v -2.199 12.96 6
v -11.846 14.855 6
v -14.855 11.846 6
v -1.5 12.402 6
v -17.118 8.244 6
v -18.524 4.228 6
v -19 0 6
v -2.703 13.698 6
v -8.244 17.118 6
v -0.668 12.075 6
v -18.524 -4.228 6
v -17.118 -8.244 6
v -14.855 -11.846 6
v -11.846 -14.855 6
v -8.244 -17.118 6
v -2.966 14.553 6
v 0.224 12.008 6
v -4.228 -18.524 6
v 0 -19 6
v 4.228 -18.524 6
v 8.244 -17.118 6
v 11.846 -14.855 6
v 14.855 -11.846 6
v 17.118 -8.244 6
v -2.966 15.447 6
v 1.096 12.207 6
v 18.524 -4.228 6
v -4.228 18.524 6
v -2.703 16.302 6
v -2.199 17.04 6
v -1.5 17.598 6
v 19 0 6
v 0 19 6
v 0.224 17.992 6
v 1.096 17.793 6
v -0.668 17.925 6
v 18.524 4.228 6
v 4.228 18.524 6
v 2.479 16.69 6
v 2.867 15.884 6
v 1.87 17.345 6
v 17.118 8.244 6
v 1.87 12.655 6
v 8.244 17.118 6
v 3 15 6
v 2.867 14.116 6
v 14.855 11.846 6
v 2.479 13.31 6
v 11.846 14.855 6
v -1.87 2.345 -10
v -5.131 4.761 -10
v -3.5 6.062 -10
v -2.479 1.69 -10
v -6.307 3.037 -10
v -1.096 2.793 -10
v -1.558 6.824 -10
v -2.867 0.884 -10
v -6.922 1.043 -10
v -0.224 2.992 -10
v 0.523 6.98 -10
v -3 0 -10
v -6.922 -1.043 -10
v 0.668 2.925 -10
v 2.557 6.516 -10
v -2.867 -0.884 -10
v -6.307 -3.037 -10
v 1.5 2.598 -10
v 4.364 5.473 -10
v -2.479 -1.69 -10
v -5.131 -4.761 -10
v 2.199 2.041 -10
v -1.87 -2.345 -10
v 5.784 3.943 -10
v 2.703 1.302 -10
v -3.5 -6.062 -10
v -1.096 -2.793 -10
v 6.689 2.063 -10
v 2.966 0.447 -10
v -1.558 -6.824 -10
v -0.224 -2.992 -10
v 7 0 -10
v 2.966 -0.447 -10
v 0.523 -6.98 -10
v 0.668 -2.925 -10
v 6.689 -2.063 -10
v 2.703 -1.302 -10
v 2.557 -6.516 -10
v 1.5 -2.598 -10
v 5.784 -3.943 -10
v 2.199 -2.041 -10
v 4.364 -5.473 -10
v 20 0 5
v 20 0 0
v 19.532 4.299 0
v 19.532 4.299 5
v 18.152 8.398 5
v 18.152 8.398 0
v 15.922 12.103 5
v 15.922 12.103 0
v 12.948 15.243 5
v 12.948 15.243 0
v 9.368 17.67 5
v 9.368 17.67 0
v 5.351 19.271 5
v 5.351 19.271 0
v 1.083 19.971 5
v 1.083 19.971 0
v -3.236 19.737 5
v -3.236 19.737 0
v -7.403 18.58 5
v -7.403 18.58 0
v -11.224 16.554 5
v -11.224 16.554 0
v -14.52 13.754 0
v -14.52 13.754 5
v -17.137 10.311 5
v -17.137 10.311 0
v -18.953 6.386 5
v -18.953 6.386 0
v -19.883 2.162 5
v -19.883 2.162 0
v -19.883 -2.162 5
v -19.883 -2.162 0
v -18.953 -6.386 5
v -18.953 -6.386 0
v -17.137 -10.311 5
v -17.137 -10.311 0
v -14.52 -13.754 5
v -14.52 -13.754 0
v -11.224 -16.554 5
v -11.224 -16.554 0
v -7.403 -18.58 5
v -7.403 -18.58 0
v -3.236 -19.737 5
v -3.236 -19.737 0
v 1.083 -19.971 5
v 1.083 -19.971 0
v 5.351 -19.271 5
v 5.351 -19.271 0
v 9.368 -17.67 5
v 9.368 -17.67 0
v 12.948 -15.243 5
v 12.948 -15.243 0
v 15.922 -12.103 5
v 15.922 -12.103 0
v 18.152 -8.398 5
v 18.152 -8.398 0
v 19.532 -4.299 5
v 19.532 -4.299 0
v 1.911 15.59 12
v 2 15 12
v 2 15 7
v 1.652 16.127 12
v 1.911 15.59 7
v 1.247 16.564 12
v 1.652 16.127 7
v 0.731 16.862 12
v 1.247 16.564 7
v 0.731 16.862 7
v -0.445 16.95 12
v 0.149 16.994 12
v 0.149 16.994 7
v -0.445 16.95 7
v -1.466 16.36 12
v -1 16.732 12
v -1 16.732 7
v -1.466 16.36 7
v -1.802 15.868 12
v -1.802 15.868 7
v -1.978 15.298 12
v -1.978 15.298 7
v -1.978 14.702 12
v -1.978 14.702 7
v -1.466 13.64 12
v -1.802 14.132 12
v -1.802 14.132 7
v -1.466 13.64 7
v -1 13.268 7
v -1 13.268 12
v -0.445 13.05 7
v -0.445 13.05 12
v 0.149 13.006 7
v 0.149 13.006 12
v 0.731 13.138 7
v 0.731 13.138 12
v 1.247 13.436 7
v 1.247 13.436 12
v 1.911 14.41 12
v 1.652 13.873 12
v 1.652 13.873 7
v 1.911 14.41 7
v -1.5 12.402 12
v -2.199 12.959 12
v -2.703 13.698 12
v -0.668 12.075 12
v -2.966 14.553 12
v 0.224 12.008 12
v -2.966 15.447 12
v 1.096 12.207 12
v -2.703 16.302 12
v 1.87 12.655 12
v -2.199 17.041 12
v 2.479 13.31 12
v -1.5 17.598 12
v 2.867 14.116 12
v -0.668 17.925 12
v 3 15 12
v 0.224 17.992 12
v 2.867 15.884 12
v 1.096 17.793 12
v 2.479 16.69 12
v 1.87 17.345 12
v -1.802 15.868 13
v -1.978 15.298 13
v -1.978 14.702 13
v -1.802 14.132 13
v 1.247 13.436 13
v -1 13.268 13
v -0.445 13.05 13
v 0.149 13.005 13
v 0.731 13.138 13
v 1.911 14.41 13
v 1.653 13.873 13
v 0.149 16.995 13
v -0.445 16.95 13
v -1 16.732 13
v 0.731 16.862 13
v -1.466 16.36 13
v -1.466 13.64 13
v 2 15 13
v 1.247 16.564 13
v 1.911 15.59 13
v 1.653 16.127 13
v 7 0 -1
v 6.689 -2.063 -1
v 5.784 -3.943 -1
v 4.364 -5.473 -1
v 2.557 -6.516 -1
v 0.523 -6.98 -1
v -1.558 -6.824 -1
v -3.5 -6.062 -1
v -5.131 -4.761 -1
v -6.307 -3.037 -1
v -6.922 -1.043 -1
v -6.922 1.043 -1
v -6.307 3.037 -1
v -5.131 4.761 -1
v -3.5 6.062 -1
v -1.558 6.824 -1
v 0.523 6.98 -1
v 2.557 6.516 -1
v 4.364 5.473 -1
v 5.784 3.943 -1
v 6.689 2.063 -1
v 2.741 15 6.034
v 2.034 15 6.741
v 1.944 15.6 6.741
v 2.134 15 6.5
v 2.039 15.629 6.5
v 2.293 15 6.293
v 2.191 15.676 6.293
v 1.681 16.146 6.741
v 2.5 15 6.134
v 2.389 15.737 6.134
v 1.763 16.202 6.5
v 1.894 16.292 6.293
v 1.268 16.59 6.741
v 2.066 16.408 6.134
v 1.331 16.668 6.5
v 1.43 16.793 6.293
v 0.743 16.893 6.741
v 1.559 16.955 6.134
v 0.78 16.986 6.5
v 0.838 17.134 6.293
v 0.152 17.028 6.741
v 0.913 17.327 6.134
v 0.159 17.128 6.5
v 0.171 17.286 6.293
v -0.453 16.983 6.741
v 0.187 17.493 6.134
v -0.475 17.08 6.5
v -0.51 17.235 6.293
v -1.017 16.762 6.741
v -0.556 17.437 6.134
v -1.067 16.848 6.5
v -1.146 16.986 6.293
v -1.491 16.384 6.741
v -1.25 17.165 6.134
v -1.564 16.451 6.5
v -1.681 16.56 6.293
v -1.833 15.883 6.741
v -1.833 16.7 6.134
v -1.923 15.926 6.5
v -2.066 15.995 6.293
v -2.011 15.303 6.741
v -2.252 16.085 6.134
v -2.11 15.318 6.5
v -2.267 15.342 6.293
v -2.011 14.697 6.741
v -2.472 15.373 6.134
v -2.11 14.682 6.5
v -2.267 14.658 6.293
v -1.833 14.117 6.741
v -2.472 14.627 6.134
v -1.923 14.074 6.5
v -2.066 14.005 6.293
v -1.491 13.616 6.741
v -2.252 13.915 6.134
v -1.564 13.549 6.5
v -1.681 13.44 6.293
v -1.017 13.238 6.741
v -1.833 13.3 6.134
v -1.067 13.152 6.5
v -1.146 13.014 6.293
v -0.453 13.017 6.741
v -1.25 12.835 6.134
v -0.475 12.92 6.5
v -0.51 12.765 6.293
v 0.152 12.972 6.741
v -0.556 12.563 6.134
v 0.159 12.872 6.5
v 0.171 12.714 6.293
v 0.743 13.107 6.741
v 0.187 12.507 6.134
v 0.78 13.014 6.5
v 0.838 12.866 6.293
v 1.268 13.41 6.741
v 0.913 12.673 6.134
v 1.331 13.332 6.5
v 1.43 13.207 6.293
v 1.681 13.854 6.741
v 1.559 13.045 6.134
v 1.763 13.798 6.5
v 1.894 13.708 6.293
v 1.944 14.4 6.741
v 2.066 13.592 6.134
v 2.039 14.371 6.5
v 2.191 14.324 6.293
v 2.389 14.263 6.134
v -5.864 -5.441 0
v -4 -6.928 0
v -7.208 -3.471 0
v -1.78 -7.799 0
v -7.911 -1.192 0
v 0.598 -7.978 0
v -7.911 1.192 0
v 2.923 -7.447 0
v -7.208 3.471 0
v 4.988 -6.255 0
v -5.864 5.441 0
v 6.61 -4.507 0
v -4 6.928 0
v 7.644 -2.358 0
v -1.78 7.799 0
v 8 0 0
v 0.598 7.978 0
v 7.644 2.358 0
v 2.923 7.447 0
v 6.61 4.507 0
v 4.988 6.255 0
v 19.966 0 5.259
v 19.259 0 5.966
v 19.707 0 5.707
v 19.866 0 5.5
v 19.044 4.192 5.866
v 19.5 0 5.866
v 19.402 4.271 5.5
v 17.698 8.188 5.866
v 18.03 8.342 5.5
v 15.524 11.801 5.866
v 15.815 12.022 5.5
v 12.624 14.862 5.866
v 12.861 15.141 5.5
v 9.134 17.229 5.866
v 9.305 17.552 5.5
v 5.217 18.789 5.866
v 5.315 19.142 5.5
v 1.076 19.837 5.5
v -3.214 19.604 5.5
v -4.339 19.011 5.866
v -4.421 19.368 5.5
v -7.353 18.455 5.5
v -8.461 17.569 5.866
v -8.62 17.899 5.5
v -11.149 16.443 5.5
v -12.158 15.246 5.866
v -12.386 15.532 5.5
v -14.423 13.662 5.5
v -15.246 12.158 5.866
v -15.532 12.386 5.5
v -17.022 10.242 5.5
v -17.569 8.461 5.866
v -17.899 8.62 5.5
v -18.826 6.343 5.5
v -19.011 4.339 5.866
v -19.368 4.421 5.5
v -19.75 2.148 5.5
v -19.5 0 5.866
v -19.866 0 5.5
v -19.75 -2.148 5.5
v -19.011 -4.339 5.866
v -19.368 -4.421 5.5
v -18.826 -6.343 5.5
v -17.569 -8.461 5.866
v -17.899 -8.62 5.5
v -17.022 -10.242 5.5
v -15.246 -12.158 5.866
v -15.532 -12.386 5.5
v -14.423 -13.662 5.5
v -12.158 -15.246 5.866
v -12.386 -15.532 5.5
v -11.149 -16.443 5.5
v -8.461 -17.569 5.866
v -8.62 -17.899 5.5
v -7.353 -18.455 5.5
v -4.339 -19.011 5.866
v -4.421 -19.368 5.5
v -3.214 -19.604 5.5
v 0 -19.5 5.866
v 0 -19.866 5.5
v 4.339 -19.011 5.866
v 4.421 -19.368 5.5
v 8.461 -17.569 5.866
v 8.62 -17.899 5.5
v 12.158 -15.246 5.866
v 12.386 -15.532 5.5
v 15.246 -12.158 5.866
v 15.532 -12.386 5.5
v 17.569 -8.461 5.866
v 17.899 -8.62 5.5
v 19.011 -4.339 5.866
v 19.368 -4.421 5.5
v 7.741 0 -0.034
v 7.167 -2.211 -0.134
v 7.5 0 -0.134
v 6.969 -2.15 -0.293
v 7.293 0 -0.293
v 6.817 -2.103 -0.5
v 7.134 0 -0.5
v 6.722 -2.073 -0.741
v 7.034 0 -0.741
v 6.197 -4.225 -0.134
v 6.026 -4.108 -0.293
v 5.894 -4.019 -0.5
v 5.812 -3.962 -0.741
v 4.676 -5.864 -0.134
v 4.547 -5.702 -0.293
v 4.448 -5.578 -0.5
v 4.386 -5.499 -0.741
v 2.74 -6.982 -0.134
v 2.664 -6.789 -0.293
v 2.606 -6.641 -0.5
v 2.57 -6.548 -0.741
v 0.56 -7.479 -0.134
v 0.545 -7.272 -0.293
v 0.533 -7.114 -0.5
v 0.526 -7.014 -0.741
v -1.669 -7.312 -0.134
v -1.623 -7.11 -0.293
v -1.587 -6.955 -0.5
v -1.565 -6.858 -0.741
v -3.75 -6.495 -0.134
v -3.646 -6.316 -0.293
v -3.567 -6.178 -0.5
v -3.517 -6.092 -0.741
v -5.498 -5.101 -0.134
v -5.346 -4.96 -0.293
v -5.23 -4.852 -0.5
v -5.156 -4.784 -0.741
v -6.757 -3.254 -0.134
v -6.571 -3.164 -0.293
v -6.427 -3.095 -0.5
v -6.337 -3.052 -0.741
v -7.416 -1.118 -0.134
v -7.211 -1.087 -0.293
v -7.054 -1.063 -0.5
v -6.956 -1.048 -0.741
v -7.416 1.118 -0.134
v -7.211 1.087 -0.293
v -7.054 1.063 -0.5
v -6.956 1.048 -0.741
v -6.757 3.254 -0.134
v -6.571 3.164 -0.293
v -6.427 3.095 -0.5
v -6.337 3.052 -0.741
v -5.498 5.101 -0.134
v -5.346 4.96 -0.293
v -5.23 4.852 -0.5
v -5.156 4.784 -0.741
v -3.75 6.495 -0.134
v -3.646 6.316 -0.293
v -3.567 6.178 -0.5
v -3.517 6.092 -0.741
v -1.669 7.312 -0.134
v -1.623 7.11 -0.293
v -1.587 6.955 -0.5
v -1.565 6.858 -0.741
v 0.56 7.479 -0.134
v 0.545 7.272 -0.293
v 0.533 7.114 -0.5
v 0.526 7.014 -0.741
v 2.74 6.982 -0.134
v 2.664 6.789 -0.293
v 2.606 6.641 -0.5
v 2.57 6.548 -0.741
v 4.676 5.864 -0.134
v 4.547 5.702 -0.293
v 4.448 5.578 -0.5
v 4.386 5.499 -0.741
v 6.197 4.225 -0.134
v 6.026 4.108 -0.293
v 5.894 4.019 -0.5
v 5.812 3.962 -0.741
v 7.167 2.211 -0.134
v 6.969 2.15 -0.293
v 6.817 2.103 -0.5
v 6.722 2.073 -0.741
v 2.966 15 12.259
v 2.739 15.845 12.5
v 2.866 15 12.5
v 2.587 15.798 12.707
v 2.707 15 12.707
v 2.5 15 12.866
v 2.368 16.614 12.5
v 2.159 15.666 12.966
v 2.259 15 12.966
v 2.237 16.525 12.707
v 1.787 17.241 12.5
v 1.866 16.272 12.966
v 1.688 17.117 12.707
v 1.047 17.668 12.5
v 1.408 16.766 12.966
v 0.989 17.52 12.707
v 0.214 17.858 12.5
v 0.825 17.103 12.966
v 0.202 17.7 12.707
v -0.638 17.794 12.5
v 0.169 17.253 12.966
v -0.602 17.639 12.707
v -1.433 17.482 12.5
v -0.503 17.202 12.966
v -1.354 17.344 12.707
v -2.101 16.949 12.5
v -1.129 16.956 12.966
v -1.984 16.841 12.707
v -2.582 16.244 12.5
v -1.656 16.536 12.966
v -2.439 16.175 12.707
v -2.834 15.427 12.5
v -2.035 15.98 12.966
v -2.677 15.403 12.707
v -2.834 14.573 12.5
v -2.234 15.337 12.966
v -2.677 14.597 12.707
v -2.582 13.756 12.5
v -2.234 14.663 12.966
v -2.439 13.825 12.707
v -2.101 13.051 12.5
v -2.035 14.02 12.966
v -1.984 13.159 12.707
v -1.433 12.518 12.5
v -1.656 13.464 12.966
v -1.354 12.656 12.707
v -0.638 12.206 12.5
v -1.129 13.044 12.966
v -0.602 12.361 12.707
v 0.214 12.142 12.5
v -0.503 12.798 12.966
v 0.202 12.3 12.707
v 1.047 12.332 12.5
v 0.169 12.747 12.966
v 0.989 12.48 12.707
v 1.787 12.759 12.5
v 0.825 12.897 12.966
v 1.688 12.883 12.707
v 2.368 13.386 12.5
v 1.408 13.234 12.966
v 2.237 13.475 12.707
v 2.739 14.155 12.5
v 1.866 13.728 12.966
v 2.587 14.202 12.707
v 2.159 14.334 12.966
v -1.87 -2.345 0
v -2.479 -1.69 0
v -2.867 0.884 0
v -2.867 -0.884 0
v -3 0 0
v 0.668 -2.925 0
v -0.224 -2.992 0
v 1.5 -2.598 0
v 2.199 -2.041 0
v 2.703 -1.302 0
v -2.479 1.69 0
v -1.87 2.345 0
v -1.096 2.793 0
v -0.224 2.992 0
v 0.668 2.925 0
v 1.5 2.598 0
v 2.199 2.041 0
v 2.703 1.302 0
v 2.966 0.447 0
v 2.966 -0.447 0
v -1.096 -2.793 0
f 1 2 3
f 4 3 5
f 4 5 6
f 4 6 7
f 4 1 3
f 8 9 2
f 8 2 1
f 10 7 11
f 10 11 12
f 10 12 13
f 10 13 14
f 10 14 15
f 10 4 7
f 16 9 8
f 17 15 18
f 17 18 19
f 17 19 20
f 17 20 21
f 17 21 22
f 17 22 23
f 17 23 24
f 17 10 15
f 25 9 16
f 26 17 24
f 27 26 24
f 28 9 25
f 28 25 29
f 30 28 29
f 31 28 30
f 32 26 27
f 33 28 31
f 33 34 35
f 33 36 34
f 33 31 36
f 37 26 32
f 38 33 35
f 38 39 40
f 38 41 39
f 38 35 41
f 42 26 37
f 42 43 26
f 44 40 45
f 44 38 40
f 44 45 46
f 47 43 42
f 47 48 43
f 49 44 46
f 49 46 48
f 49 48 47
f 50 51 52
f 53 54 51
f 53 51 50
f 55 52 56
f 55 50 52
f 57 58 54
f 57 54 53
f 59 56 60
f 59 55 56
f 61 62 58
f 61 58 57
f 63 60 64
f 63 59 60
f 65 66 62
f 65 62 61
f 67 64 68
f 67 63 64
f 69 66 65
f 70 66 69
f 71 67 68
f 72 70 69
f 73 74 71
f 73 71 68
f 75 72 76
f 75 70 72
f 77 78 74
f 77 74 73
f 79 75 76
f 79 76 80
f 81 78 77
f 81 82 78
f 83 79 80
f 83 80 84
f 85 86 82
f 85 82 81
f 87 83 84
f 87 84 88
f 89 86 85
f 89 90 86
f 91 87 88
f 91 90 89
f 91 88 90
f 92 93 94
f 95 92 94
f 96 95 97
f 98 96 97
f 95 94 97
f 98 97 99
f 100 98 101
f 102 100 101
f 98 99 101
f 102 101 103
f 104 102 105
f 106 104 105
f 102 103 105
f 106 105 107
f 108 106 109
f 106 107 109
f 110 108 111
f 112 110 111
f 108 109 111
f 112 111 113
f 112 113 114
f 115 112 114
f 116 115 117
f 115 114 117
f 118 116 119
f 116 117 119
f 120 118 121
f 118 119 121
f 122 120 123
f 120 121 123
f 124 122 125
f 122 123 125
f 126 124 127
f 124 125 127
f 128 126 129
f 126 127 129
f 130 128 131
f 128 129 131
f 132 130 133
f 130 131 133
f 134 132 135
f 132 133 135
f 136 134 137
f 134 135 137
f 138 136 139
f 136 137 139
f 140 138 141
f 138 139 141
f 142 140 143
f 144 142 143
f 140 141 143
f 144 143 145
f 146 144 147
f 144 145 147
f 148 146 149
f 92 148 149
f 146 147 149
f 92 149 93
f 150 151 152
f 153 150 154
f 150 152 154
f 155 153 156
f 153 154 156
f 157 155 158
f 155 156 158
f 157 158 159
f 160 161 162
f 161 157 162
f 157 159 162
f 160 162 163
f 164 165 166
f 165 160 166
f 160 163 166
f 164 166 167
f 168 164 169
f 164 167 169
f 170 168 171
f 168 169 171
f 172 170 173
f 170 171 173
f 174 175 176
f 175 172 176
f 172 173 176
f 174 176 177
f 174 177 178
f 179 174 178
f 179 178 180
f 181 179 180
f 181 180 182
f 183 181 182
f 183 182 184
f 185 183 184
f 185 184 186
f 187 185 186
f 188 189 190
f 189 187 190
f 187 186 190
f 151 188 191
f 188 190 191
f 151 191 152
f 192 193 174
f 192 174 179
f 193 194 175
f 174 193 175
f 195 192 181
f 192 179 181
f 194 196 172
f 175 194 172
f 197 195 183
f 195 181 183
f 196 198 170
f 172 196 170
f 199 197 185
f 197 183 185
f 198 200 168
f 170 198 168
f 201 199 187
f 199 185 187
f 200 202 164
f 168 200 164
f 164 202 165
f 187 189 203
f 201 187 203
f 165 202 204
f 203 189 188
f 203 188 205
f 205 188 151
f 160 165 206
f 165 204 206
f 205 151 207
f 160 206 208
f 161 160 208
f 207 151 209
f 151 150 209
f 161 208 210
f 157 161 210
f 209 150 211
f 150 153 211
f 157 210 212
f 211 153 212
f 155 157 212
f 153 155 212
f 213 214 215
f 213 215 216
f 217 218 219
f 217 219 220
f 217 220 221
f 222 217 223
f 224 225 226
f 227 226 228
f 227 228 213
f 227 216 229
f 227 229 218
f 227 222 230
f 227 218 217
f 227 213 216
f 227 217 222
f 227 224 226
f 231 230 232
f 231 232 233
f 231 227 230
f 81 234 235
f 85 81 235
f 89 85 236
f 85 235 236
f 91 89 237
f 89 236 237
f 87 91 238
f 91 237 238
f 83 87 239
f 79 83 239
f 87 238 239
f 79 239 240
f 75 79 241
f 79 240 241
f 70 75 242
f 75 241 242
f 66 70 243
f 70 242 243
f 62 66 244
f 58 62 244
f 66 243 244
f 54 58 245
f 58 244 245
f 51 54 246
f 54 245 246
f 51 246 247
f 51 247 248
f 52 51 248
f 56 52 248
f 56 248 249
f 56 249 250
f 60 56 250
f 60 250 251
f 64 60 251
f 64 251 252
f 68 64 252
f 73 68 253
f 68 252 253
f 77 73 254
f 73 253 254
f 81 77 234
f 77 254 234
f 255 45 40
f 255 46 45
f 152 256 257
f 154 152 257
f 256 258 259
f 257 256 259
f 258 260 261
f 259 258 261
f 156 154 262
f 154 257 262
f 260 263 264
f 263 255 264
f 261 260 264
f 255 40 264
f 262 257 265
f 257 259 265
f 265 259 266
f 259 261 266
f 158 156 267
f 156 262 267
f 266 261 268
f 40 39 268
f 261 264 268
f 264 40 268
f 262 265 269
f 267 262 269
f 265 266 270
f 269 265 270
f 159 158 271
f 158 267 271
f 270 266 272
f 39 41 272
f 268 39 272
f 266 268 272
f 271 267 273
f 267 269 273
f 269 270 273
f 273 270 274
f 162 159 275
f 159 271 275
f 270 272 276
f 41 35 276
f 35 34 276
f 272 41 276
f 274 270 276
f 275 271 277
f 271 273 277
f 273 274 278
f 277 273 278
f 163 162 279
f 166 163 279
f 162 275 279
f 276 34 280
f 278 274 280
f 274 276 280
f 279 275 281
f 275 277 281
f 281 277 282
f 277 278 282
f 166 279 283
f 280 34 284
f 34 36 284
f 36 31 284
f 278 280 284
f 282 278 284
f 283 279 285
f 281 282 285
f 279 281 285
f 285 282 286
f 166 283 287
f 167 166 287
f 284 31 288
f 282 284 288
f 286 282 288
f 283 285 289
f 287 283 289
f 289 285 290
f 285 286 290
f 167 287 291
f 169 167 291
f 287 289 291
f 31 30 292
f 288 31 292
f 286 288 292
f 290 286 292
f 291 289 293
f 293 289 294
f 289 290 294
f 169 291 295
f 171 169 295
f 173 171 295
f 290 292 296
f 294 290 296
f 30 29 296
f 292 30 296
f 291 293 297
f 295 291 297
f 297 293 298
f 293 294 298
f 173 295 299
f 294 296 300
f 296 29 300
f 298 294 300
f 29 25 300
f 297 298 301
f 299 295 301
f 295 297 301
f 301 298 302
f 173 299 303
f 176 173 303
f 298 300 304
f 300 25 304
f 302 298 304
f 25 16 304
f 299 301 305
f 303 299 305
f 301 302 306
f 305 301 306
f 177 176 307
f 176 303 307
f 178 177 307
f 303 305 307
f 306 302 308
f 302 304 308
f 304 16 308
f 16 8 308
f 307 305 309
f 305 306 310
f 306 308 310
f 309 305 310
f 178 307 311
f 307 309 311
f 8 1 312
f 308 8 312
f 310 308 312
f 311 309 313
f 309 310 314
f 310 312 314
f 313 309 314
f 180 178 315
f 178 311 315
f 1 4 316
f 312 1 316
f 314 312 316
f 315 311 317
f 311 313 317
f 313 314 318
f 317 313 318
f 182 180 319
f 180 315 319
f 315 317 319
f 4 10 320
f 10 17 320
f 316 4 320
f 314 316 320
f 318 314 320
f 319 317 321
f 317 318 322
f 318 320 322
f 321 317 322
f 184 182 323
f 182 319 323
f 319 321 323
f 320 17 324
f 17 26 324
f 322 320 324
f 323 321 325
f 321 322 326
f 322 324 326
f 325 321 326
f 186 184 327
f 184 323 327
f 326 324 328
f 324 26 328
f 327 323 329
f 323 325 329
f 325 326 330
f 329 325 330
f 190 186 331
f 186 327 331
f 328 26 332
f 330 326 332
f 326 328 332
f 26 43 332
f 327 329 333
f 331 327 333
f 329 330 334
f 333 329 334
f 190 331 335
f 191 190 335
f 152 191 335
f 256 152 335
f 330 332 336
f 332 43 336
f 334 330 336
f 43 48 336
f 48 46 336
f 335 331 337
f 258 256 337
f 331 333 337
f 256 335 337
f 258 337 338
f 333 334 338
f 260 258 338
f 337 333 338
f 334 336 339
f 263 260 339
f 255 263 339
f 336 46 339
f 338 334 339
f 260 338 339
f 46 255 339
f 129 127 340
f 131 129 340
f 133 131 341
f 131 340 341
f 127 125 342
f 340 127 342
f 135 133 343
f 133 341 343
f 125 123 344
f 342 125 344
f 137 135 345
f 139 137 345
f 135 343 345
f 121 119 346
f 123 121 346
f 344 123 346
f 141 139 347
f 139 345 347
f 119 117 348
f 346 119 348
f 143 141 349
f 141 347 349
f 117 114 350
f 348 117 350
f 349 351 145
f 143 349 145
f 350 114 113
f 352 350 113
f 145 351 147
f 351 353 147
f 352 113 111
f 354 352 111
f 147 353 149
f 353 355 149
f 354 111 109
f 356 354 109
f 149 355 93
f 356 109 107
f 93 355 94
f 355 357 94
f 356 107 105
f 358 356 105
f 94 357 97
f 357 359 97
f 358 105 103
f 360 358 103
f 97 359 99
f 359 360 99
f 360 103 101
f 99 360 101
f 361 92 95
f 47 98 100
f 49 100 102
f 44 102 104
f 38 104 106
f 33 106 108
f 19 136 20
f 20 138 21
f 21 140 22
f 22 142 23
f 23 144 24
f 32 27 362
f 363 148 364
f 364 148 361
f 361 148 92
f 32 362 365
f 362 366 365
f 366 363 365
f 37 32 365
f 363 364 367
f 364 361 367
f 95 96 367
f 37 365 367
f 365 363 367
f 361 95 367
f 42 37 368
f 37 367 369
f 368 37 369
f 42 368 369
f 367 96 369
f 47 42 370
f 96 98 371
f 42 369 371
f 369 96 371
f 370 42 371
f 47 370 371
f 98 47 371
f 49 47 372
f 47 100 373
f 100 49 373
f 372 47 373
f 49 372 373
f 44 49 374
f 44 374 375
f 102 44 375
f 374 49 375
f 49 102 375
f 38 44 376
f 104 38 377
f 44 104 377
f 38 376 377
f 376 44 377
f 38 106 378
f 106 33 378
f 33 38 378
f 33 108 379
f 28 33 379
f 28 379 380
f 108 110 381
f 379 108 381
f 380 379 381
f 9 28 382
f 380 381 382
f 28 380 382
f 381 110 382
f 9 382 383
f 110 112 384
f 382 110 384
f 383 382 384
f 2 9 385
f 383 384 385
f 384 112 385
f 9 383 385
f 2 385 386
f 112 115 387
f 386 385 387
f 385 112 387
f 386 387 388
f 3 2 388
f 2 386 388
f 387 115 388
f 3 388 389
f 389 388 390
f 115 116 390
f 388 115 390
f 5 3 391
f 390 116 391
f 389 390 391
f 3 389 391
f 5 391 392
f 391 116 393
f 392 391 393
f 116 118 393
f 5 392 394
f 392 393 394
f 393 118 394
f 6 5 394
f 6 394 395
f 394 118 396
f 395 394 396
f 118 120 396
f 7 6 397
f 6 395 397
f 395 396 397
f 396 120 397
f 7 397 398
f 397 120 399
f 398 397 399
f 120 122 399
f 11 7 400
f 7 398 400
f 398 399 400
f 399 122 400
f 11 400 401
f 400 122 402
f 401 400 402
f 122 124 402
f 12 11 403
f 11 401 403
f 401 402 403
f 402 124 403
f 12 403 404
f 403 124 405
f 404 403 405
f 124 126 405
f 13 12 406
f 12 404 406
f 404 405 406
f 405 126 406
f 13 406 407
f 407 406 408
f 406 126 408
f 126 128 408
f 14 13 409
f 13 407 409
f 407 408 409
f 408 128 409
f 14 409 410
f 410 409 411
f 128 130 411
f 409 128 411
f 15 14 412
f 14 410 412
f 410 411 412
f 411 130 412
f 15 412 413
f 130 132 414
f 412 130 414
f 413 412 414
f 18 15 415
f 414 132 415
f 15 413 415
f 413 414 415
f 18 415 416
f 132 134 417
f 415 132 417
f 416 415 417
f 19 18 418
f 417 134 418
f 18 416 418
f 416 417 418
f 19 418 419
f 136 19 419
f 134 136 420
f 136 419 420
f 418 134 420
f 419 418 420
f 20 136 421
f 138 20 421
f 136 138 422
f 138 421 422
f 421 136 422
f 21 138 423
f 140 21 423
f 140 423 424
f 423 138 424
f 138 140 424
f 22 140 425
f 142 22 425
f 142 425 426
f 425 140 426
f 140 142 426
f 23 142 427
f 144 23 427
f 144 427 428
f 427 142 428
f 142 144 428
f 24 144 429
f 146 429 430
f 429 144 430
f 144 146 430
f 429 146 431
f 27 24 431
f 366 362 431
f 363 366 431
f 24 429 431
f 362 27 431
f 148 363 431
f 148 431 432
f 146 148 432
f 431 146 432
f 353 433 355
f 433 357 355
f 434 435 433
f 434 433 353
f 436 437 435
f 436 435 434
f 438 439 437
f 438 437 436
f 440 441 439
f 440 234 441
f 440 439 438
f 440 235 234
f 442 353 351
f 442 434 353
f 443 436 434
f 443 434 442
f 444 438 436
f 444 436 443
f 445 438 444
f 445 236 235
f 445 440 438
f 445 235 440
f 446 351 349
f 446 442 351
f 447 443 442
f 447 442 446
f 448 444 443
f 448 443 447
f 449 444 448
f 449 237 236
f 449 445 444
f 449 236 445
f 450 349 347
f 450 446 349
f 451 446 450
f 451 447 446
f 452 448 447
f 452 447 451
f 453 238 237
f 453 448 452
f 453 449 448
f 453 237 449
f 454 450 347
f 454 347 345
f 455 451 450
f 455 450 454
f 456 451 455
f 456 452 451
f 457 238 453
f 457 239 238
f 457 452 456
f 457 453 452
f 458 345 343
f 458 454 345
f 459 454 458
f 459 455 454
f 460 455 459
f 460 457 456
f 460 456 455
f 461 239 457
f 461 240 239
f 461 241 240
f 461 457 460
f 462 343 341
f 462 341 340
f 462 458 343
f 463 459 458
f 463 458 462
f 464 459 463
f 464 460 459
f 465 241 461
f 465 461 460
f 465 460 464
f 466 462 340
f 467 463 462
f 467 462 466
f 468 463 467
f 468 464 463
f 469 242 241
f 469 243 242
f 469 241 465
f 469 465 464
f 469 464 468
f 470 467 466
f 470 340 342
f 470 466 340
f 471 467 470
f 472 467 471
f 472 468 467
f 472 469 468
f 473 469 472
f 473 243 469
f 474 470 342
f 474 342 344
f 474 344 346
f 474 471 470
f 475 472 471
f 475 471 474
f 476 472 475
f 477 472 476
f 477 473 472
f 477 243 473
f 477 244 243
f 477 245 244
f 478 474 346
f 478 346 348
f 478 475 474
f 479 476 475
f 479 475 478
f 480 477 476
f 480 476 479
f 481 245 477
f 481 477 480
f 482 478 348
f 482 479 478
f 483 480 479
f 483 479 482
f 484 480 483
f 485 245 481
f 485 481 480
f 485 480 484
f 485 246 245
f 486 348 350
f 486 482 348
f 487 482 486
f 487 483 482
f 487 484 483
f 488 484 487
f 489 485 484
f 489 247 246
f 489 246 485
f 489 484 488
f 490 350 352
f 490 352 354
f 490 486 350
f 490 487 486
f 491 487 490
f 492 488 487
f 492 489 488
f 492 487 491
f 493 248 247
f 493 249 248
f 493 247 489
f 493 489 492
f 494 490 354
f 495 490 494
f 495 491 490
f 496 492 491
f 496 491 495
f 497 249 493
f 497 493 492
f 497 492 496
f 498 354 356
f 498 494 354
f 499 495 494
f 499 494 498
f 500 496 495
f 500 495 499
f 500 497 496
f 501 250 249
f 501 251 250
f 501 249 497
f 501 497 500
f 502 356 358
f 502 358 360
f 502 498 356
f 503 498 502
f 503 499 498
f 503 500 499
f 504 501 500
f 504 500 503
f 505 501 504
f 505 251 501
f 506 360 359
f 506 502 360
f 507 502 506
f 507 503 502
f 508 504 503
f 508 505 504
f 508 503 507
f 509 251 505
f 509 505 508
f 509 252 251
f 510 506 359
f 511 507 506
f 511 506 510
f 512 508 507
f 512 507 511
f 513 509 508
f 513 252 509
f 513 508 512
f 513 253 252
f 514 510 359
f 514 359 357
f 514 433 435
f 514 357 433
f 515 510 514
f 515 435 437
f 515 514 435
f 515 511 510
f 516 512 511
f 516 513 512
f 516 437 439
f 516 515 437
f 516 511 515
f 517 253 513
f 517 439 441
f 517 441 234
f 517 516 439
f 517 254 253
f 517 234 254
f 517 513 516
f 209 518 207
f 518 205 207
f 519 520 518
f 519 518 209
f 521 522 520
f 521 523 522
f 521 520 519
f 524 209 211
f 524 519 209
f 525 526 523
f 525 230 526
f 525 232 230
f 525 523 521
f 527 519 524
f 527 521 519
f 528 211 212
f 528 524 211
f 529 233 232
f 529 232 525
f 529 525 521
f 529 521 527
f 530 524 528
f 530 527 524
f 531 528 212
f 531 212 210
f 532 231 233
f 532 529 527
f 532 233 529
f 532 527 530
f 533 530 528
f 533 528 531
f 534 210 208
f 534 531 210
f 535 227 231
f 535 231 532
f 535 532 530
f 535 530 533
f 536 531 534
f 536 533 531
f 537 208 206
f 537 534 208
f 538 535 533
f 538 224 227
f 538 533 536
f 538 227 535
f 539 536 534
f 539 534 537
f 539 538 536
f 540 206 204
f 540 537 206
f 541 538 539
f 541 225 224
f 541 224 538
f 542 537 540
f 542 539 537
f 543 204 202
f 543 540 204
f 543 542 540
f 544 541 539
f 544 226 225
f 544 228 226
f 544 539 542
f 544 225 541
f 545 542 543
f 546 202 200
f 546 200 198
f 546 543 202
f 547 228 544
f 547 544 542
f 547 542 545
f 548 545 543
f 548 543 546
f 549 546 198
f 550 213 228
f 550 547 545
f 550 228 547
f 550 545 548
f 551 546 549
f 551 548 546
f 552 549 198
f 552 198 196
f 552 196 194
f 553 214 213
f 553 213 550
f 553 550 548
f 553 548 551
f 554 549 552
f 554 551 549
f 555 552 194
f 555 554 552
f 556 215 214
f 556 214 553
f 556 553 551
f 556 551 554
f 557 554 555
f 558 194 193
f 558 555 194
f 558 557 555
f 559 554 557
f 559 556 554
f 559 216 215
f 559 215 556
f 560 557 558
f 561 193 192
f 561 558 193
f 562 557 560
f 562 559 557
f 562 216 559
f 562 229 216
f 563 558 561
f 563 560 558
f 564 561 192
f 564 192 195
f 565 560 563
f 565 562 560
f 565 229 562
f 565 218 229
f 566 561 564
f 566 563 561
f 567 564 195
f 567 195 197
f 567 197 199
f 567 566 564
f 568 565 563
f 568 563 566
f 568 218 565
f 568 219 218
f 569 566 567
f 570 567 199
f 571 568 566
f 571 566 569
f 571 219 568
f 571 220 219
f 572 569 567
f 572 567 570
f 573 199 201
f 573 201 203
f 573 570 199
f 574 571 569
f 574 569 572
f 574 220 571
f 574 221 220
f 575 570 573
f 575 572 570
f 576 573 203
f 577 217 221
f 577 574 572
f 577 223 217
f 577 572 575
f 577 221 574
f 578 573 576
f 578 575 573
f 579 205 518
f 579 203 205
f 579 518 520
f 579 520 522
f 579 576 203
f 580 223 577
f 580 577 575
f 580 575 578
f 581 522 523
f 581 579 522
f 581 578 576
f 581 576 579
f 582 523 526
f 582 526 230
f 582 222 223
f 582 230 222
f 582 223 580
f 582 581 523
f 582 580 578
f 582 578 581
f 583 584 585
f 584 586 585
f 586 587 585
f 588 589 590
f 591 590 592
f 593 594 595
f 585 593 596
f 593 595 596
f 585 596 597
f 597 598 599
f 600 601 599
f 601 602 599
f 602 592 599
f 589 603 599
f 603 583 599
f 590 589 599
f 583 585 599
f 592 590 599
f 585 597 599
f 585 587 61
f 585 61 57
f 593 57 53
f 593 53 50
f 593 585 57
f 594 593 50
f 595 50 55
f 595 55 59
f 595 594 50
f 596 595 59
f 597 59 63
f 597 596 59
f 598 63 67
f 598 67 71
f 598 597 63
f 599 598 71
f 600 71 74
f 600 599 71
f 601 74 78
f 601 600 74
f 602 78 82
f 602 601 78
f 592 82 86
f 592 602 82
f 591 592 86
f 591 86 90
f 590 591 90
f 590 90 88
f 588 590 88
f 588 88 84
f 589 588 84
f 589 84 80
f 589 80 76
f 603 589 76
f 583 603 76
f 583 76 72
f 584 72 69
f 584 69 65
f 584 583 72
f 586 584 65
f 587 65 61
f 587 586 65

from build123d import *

# Parameters (mm, degrees)
SKETCH1_R           = 20
BOSS_EXTRUDE1_DEPTH = 6
SKETCH2_R           = 7
SKETCH2_R_2         = 3
BOSS_EXTRUDE2_DEPTH = 10
SKETCH3_R           = 2
BOSS_EXTRUDE3_DEPTH = 7
SKETCH4_R           = 3
BOSS_EXTRUDE4_DEPTH = 1
FILLET1_R           = 1


with BuildPart() as part:
    # Sketch1 → Boss-Extrude1 (new body)
    with BuildSketch(Plane.XY):
        Circle(SKETCH1_R)
    extrude(amount=BOSS_EXTRUDE1_DEPTH)

    # Sketch2 → Boss-Extrude2 (add)
    with BuildSketch(Plane(origin=(0, 0, 0), x_dir=(-1, 0, 0), z_dir=(0, 0, -1))):
        with Locations(Location((0, 0, 0), (0, 0, 180))):
            Circle(SKETCH2_R)
        Circle(SKETCH2_R_2, mode=Mode.SUBTRACT)
    extrude(amount=BOSS_EXTRUDE2_DEPTH)

    # Sketch3 → Boss-Extrude3 (add)
    with BuildSketch(Plane.XY.offset(6)):
        with Locations((0, 15)):
            Circle(SKETCH3_R)
    extrude(amount=BOSS_EXTRUDE3_DEPTH)

    # Sketch4 → Boss-Extrude4 (add)
    with BuildSketch(Plane.XY.offset(13)):
        with Locations((0, 15)):
            Circle(SKETCH4_R)
    extrude(amount=-BOSS_EXTRUDE4_DEPTH)

    # Fillet1
    fillet1_edges = [part.edges().sort_by_distance(p)[0] for p in [
        (-2, 15, 6),
        (-3, 15, 13),
        (-20, 0, 6),
        (-7, 0, 0),
    ]]
    fillet(fillet1_edges, radius=FILLET1_R - 0.0001)  # a hair under: the kernel refuses the full size


solid = part.part
